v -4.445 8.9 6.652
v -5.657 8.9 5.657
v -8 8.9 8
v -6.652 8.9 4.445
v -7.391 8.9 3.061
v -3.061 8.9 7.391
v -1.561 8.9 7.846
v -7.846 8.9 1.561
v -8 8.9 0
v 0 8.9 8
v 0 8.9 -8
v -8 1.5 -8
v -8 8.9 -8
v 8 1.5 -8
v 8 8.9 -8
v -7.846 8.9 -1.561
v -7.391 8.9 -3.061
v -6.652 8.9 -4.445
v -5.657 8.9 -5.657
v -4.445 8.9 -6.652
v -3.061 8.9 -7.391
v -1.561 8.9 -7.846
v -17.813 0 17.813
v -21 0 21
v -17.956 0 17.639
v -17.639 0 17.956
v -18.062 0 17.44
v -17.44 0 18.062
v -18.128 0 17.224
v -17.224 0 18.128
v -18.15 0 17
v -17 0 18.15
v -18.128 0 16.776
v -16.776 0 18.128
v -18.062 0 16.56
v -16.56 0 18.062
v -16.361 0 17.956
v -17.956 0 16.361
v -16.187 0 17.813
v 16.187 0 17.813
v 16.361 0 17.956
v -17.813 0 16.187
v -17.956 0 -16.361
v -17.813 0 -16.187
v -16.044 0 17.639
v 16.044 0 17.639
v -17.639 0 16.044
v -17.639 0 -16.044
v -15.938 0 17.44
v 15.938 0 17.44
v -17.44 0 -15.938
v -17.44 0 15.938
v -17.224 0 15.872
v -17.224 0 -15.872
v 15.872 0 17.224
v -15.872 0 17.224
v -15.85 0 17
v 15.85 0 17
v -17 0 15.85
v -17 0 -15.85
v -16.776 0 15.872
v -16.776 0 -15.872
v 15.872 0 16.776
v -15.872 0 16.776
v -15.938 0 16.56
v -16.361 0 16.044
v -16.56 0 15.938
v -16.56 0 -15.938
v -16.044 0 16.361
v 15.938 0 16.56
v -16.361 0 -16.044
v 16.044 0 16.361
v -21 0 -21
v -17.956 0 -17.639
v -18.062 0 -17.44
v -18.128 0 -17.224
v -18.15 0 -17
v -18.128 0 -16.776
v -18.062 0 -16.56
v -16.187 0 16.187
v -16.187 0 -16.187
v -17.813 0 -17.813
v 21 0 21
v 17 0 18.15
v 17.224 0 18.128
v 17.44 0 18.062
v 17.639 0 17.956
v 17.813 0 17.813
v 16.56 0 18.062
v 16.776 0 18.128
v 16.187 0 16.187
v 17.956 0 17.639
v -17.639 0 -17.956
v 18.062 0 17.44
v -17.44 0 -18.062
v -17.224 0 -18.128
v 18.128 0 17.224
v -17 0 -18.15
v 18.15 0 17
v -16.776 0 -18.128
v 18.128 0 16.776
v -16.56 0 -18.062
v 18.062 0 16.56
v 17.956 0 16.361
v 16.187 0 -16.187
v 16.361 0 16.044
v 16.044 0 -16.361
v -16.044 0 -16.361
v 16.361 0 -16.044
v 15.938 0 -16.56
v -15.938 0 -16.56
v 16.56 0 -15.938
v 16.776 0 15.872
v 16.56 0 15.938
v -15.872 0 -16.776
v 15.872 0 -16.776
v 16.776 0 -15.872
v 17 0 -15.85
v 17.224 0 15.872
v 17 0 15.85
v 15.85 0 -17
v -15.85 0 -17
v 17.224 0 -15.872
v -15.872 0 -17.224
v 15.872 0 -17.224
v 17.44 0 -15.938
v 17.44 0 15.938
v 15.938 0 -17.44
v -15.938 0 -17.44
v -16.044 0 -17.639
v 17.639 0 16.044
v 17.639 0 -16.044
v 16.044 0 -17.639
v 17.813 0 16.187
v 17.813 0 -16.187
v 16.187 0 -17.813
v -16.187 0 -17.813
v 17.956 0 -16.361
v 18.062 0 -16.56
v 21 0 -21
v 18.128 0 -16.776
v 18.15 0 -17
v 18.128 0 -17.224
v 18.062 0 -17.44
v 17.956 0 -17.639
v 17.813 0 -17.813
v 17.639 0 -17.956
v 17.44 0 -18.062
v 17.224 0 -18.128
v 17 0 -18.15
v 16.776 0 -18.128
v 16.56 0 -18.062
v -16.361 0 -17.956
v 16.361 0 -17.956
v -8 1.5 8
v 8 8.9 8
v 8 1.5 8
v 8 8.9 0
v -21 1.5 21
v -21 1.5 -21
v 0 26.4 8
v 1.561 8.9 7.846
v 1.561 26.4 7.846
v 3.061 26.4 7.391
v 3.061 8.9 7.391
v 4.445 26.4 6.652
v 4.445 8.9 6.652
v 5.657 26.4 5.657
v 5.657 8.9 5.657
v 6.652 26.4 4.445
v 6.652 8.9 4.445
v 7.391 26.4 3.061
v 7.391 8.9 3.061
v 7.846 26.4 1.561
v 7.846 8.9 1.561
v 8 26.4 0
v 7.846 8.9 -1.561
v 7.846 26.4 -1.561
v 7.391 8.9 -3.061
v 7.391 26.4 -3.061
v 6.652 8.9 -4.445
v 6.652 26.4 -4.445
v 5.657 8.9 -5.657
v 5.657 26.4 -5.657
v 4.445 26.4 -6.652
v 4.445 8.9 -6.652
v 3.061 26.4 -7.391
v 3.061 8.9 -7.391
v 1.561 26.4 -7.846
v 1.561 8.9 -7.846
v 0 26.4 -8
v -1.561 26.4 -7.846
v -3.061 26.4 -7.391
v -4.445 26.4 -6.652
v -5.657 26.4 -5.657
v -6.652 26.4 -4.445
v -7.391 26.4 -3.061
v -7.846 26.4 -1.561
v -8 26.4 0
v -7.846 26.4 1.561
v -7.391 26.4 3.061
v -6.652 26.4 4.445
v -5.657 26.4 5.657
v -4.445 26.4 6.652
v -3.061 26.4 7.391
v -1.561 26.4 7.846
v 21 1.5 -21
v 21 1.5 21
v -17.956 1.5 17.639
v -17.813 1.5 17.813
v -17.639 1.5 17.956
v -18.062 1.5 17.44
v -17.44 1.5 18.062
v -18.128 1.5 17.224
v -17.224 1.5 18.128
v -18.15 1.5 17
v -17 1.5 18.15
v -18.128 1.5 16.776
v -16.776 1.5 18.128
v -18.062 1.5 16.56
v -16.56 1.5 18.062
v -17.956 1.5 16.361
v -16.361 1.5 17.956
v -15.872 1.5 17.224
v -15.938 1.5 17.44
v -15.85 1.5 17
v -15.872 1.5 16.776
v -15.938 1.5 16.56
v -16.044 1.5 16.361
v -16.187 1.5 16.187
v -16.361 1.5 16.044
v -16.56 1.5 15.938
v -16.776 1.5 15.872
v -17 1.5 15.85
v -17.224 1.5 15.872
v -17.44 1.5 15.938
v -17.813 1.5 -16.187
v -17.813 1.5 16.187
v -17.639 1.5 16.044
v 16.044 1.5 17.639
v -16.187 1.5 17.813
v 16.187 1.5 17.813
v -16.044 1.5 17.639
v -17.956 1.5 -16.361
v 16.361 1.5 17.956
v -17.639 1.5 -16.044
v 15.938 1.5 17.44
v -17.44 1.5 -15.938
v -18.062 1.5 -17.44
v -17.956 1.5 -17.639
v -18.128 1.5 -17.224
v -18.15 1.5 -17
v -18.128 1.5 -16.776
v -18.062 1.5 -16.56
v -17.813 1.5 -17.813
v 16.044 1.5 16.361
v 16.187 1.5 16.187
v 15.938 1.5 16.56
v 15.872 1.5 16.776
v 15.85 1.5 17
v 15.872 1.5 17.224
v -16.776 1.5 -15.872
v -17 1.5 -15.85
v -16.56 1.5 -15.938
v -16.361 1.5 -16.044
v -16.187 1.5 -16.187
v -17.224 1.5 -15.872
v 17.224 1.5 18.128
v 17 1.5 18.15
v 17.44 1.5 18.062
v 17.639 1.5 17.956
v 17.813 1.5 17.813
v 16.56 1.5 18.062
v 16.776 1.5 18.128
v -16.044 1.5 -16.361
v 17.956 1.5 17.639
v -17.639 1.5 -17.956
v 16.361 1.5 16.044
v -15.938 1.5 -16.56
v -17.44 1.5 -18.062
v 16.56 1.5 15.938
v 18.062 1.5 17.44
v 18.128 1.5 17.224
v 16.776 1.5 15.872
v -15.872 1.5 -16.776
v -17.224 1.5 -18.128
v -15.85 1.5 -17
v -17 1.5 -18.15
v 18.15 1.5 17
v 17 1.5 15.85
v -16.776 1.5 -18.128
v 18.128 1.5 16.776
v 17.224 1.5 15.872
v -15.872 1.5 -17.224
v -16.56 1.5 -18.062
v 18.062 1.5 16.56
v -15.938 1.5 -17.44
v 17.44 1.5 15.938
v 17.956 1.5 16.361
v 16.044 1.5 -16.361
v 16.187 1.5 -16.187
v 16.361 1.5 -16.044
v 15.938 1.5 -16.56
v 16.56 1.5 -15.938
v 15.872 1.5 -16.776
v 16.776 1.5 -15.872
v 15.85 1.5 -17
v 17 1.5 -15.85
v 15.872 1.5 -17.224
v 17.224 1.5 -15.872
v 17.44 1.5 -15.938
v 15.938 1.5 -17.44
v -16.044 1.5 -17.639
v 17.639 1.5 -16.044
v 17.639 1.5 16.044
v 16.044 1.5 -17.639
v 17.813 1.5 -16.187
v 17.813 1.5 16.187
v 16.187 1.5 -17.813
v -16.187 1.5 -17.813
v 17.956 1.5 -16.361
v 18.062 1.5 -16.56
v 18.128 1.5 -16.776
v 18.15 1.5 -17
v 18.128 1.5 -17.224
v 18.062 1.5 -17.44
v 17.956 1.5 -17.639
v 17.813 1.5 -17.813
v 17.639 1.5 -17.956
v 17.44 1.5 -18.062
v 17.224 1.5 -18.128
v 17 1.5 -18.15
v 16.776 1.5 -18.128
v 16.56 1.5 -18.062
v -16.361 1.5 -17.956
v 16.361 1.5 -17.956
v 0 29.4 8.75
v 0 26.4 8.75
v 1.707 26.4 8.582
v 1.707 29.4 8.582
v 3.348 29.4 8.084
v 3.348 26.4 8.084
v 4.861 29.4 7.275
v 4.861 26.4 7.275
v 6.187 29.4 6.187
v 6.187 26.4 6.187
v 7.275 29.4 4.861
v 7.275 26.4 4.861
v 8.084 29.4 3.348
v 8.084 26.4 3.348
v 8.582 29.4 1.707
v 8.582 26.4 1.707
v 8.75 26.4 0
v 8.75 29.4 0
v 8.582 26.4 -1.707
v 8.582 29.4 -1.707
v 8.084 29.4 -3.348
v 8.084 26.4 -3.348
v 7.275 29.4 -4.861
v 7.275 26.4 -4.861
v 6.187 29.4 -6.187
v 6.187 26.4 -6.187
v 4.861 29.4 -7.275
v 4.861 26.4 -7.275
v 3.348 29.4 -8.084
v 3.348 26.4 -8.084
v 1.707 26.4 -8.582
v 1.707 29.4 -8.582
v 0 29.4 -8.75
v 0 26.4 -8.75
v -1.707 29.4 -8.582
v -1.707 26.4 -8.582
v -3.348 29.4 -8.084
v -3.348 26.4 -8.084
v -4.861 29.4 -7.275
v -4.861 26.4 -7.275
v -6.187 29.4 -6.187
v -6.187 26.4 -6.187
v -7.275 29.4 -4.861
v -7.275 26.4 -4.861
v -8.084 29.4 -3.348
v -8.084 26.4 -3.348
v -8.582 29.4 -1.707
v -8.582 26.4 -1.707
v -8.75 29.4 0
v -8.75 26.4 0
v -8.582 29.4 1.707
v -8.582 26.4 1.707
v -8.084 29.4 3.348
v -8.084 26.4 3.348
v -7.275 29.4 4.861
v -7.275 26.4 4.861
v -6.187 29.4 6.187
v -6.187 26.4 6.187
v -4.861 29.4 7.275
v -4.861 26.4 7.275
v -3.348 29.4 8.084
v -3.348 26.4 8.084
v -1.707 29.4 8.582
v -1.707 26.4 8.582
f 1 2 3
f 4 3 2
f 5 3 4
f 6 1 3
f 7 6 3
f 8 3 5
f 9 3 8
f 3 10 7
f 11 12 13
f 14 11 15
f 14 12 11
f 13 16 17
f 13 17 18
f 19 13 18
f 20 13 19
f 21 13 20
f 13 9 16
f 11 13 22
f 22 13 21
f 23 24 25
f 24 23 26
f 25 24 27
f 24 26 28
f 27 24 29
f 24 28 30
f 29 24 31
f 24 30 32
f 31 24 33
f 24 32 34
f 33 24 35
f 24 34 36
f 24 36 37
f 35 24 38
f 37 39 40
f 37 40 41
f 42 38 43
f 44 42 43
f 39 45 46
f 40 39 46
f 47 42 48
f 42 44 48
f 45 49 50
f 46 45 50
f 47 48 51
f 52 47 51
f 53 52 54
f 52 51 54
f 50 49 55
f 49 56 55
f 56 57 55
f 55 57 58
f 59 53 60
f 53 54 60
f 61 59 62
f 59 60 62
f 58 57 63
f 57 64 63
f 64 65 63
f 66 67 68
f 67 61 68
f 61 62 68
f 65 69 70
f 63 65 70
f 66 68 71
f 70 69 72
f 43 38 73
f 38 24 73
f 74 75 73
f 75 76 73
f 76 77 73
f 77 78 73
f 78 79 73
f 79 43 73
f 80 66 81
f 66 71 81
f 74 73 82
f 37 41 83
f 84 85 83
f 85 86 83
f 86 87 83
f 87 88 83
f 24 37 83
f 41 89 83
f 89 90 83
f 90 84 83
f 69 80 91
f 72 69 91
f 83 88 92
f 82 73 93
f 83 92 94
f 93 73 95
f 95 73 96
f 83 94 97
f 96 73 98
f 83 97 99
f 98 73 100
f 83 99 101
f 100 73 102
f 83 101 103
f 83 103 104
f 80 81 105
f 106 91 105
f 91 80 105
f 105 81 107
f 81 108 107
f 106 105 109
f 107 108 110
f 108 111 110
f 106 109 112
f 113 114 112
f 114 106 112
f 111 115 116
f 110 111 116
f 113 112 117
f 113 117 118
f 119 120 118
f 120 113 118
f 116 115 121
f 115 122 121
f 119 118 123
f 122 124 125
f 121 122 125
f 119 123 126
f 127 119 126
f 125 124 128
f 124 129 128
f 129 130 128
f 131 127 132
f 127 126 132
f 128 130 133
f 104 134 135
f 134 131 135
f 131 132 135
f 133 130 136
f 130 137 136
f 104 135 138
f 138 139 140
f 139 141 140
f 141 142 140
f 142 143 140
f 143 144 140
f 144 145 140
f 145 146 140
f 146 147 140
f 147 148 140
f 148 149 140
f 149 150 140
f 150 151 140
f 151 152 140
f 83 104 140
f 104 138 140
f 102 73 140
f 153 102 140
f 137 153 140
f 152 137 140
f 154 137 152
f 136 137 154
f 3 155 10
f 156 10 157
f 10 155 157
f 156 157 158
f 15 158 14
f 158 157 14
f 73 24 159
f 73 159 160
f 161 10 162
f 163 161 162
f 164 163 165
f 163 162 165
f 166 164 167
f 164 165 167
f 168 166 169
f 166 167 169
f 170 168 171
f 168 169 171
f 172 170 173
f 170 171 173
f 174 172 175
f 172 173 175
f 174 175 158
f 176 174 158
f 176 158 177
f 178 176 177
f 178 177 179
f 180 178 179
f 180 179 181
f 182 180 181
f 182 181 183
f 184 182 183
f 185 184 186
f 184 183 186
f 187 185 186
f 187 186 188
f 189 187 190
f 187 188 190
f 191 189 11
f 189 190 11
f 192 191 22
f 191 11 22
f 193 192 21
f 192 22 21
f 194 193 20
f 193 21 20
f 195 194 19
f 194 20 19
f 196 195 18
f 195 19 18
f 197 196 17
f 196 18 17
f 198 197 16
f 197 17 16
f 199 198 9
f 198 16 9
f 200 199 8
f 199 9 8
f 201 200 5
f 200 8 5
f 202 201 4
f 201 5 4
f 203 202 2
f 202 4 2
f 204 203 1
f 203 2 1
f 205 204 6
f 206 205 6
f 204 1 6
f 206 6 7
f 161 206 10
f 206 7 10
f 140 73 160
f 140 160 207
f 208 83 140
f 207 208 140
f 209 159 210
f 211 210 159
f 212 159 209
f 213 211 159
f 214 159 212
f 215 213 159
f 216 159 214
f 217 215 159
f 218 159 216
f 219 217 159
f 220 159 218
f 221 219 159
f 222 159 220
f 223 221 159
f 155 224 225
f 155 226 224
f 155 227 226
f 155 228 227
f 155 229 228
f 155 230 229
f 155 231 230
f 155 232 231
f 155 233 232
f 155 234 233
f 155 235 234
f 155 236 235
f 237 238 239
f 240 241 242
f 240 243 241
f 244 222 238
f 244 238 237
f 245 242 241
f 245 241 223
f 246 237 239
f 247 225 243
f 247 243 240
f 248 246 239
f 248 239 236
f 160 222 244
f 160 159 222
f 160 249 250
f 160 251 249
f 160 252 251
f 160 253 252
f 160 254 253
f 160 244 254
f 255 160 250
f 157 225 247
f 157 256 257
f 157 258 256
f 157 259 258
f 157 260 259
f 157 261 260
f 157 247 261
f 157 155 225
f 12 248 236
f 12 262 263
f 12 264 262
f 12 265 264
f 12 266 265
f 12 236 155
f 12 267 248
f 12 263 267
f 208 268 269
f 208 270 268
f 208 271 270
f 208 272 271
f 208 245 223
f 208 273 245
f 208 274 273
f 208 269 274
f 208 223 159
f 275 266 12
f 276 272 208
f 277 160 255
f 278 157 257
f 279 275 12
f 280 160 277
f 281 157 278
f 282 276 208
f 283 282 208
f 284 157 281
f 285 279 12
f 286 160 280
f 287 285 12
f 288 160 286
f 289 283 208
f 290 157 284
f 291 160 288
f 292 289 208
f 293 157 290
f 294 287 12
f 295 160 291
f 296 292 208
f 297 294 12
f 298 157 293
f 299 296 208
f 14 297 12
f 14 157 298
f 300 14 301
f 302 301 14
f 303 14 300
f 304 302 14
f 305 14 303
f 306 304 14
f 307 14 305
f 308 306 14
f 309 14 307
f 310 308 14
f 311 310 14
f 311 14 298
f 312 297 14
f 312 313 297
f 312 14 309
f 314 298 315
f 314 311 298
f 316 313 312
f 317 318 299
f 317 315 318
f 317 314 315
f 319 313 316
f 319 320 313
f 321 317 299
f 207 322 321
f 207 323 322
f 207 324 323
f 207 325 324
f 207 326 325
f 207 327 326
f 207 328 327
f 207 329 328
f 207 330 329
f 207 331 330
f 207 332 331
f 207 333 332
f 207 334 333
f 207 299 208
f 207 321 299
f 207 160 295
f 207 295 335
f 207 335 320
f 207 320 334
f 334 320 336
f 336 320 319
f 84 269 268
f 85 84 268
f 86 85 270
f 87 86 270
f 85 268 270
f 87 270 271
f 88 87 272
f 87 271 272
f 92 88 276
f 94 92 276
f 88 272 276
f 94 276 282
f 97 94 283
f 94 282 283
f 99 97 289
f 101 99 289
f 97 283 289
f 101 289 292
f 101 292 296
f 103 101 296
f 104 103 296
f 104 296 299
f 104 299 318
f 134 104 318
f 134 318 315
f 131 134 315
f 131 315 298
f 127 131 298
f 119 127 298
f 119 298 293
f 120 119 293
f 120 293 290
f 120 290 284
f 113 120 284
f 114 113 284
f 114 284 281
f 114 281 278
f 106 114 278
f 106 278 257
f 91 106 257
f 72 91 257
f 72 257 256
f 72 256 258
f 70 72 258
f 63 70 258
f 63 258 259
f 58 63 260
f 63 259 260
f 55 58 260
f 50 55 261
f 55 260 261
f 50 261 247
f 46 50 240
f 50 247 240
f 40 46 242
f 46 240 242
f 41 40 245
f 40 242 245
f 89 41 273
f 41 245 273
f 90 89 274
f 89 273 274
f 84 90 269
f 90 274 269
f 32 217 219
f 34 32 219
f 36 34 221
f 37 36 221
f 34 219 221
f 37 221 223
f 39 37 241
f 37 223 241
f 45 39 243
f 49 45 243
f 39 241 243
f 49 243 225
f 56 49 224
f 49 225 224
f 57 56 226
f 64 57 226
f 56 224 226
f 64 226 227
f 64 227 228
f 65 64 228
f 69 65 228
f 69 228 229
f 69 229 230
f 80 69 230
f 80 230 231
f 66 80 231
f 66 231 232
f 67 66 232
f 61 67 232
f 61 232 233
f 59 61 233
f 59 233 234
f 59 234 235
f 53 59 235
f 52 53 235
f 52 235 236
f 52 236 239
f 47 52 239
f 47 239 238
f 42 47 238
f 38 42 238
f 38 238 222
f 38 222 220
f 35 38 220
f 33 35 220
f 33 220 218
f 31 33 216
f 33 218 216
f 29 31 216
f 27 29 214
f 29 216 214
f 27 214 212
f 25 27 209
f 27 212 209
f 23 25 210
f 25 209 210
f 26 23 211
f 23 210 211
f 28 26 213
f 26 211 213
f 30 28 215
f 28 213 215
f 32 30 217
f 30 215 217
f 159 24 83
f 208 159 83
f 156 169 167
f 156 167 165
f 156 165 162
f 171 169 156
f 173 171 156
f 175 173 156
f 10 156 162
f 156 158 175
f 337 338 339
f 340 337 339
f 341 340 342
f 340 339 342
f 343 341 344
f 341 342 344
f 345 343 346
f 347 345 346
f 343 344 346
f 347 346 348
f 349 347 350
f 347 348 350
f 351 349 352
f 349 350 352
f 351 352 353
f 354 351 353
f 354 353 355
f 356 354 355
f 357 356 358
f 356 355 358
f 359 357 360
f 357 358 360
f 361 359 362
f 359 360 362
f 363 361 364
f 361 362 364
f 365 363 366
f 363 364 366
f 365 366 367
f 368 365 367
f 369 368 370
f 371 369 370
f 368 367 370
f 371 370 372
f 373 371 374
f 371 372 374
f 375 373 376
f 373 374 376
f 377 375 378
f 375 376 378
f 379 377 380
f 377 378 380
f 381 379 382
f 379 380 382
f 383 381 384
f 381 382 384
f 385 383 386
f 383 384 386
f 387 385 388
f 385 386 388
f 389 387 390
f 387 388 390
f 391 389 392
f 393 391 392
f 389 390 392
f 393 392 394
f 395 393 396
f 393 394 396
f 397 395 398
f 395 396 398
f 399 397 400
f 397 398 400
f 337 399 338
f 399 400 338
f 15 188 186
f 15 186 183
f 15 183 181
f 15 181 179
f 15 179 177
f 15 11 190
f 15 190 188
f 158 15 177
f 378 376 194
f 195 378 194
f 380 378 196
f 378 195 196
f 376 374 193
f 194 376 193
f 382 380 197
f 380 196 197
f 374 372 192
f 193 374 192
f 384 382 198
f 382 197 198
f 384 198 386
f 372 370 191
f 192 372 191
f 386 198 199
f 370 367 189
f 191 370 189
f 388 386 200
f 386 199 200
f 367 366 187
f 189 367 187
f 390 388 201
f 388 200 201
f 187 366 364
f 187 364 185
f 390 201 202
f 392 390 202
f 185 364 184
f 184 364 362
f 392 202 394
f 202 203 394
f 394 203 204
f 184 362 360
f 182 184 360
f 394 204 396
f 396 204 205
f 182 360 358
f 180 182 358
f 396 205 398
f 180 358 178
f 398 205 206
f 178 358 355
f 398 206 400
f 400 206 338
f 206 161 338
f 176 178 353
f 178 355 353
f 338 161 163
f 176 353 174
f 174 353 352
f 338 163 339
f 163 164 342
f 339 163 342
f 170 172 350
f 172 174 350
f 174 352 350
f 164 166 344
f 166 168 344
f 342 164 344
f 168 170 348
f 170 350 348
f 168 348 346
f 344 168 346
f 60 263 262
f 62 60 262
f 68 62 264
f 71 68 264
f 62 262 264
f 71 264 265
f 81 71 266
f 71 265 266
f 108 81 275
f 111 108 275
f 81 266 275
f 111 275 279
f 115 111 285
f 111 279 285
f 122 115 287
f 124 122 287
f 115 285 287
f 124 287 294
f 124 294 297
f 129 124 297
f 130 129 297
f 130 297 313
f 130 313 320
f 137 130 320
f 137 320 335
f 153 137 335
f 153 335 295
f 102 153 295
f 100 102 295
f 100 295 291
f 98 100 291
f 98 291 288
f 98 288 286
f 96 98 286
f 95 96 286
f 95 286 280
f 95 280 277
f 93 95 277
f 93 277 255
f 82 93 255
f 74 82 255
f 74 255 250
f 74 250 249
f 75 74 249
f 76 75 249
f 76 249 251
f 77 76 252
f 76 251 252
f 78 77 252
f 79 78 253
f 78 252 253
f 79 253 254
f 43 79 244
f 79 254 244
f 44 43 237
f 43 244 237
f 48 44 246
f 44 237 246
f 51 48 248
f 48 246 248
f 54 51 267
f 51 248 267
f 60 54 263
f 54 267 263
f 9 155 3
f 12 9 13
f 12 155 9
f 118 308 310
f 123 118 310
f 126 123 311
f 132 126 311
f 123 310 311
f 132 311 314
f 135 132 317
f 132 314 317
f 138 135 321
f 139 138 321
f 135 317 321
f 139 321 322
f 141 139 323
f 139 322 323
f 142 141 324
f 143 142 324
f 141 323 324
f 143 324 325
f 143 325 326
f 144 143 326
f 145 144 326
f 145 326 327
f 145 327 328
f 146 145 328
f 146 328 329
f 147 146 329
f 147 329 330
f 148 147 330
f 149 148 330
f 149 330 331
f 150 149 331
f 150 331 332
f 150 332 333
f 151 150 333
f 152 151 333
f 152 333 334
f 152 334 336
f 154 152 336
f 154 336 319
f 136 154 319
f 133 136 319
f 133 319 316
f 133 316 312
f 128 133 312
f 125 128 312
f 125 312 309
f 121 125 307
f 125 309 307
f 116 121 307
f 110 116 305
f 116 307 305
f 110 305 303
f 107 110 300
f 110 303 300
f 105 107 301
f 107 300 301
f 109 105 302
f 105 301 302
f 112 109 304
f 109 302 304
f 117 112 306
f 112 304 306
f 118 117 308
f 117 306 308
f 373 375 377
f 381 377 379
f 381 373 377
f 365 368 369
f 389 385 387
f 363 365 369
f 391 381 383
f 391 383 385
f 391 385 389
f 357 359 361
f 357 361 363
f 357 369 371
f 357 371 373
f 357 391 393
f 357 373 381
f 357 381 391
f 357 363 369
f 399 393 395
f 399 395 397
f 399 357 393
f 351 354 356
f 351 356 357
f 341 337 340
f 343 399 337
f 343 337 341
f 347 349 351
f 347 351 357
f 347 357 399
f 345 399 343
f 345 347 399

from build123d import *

# Parameters (mm, degrees)
SKETCH_1_W          = 42
SKETCH_1_H          = 42
EXTRUDE_1_DEPTH     = 1.5
SKETCH_2_R          = 1.15
CUT_EXTRUDE_1_DEPTH = 2
SKETCH_3_R          = 8
EXTRUDE_2_DEPTH     = 24.9
SKETCH_4_W          = 16
SKETCH_4_H          = 16
EXTRUDE_3_DEPTH     = 7.4
SKETCH_5_R          = 8.75
EXTRUDE_4_DEPTH     = 3


with BuildPart() as part:
    # 草图1 → 凸台-拉伸1 (new body)
    with BuildSketch(Plane(origin=(0, 0, 0), x_dir=(1, 0, 0), z_dir=(0, 1, 0))):
        Rectangle(SKETCH_1_W, SKETCH_1_H)
    extrude(amount=EXTRUDE_1_DEPTH)

    # 草图2 → 切除-拉伸1 (cut)
    with BuildSketch(Plane(origin=(0, 1.5, 0), x_dir=(1, 0, 0), z_dir=(0, 1, 0))):
        with Locations(Location((-17, 17, 0), (0, 0, 270))):
            Circle(SKETCH_2_R)
        with Locations(Location((17, 17, 0), (0, 0, 270))):
            Circle(SKETCH_2_R)
        with Locations(Location((-17, -17, 0), (0, 0, 270))):
            Circle(SKETCH_2_R)
        with Locations(Location((17, -17, 0), (0, 0, 270))):
            Circle(SKETCH_2_R)
    extrude(amount=-CUT_EXTRUDE_1_DEPTH, mode=Mode.SUBTRACT)

    # 草图3 → 凸台-拉伸2 (add)
    with BuildSketch(Plane(origin=(0, 1.5, 0), x_dir=(1, 0, 0), z_dir=(0, 1, 0))):
        with Locations(Location((0, 0, 0), (0, 0, 270))):
            Circle(SKETCH_3_R)
    extrude(amount=EXTRUDE_2_DEPTH)

    # 草图4 → 凸台-拉伸3 (add)
    with BuildSketch(Plane(origin=(0, 1.5, 0), x_dir=(1, 0, 0), z_dir=(0, 1, 0))):
        Rectangle(SKETCH_4_W, SKETCH_4_H)
    extrude(amount=EXTRUDE_3_DEPTH)

    # 草图5 → 凸台-拉伸4 (add)
    with BuildSketch(Plane(origin=(0, 26.4, 0), x_dir=(1, 0, 0), z_dir=(0, 1, 0))):
        with Locations(Location((0, 0, 0), (0, 0, 270))):
            Circle(SKETCH_5_R)
    extrude(amount=EXTRUDE_4_DEPTH)


solid = part.part
